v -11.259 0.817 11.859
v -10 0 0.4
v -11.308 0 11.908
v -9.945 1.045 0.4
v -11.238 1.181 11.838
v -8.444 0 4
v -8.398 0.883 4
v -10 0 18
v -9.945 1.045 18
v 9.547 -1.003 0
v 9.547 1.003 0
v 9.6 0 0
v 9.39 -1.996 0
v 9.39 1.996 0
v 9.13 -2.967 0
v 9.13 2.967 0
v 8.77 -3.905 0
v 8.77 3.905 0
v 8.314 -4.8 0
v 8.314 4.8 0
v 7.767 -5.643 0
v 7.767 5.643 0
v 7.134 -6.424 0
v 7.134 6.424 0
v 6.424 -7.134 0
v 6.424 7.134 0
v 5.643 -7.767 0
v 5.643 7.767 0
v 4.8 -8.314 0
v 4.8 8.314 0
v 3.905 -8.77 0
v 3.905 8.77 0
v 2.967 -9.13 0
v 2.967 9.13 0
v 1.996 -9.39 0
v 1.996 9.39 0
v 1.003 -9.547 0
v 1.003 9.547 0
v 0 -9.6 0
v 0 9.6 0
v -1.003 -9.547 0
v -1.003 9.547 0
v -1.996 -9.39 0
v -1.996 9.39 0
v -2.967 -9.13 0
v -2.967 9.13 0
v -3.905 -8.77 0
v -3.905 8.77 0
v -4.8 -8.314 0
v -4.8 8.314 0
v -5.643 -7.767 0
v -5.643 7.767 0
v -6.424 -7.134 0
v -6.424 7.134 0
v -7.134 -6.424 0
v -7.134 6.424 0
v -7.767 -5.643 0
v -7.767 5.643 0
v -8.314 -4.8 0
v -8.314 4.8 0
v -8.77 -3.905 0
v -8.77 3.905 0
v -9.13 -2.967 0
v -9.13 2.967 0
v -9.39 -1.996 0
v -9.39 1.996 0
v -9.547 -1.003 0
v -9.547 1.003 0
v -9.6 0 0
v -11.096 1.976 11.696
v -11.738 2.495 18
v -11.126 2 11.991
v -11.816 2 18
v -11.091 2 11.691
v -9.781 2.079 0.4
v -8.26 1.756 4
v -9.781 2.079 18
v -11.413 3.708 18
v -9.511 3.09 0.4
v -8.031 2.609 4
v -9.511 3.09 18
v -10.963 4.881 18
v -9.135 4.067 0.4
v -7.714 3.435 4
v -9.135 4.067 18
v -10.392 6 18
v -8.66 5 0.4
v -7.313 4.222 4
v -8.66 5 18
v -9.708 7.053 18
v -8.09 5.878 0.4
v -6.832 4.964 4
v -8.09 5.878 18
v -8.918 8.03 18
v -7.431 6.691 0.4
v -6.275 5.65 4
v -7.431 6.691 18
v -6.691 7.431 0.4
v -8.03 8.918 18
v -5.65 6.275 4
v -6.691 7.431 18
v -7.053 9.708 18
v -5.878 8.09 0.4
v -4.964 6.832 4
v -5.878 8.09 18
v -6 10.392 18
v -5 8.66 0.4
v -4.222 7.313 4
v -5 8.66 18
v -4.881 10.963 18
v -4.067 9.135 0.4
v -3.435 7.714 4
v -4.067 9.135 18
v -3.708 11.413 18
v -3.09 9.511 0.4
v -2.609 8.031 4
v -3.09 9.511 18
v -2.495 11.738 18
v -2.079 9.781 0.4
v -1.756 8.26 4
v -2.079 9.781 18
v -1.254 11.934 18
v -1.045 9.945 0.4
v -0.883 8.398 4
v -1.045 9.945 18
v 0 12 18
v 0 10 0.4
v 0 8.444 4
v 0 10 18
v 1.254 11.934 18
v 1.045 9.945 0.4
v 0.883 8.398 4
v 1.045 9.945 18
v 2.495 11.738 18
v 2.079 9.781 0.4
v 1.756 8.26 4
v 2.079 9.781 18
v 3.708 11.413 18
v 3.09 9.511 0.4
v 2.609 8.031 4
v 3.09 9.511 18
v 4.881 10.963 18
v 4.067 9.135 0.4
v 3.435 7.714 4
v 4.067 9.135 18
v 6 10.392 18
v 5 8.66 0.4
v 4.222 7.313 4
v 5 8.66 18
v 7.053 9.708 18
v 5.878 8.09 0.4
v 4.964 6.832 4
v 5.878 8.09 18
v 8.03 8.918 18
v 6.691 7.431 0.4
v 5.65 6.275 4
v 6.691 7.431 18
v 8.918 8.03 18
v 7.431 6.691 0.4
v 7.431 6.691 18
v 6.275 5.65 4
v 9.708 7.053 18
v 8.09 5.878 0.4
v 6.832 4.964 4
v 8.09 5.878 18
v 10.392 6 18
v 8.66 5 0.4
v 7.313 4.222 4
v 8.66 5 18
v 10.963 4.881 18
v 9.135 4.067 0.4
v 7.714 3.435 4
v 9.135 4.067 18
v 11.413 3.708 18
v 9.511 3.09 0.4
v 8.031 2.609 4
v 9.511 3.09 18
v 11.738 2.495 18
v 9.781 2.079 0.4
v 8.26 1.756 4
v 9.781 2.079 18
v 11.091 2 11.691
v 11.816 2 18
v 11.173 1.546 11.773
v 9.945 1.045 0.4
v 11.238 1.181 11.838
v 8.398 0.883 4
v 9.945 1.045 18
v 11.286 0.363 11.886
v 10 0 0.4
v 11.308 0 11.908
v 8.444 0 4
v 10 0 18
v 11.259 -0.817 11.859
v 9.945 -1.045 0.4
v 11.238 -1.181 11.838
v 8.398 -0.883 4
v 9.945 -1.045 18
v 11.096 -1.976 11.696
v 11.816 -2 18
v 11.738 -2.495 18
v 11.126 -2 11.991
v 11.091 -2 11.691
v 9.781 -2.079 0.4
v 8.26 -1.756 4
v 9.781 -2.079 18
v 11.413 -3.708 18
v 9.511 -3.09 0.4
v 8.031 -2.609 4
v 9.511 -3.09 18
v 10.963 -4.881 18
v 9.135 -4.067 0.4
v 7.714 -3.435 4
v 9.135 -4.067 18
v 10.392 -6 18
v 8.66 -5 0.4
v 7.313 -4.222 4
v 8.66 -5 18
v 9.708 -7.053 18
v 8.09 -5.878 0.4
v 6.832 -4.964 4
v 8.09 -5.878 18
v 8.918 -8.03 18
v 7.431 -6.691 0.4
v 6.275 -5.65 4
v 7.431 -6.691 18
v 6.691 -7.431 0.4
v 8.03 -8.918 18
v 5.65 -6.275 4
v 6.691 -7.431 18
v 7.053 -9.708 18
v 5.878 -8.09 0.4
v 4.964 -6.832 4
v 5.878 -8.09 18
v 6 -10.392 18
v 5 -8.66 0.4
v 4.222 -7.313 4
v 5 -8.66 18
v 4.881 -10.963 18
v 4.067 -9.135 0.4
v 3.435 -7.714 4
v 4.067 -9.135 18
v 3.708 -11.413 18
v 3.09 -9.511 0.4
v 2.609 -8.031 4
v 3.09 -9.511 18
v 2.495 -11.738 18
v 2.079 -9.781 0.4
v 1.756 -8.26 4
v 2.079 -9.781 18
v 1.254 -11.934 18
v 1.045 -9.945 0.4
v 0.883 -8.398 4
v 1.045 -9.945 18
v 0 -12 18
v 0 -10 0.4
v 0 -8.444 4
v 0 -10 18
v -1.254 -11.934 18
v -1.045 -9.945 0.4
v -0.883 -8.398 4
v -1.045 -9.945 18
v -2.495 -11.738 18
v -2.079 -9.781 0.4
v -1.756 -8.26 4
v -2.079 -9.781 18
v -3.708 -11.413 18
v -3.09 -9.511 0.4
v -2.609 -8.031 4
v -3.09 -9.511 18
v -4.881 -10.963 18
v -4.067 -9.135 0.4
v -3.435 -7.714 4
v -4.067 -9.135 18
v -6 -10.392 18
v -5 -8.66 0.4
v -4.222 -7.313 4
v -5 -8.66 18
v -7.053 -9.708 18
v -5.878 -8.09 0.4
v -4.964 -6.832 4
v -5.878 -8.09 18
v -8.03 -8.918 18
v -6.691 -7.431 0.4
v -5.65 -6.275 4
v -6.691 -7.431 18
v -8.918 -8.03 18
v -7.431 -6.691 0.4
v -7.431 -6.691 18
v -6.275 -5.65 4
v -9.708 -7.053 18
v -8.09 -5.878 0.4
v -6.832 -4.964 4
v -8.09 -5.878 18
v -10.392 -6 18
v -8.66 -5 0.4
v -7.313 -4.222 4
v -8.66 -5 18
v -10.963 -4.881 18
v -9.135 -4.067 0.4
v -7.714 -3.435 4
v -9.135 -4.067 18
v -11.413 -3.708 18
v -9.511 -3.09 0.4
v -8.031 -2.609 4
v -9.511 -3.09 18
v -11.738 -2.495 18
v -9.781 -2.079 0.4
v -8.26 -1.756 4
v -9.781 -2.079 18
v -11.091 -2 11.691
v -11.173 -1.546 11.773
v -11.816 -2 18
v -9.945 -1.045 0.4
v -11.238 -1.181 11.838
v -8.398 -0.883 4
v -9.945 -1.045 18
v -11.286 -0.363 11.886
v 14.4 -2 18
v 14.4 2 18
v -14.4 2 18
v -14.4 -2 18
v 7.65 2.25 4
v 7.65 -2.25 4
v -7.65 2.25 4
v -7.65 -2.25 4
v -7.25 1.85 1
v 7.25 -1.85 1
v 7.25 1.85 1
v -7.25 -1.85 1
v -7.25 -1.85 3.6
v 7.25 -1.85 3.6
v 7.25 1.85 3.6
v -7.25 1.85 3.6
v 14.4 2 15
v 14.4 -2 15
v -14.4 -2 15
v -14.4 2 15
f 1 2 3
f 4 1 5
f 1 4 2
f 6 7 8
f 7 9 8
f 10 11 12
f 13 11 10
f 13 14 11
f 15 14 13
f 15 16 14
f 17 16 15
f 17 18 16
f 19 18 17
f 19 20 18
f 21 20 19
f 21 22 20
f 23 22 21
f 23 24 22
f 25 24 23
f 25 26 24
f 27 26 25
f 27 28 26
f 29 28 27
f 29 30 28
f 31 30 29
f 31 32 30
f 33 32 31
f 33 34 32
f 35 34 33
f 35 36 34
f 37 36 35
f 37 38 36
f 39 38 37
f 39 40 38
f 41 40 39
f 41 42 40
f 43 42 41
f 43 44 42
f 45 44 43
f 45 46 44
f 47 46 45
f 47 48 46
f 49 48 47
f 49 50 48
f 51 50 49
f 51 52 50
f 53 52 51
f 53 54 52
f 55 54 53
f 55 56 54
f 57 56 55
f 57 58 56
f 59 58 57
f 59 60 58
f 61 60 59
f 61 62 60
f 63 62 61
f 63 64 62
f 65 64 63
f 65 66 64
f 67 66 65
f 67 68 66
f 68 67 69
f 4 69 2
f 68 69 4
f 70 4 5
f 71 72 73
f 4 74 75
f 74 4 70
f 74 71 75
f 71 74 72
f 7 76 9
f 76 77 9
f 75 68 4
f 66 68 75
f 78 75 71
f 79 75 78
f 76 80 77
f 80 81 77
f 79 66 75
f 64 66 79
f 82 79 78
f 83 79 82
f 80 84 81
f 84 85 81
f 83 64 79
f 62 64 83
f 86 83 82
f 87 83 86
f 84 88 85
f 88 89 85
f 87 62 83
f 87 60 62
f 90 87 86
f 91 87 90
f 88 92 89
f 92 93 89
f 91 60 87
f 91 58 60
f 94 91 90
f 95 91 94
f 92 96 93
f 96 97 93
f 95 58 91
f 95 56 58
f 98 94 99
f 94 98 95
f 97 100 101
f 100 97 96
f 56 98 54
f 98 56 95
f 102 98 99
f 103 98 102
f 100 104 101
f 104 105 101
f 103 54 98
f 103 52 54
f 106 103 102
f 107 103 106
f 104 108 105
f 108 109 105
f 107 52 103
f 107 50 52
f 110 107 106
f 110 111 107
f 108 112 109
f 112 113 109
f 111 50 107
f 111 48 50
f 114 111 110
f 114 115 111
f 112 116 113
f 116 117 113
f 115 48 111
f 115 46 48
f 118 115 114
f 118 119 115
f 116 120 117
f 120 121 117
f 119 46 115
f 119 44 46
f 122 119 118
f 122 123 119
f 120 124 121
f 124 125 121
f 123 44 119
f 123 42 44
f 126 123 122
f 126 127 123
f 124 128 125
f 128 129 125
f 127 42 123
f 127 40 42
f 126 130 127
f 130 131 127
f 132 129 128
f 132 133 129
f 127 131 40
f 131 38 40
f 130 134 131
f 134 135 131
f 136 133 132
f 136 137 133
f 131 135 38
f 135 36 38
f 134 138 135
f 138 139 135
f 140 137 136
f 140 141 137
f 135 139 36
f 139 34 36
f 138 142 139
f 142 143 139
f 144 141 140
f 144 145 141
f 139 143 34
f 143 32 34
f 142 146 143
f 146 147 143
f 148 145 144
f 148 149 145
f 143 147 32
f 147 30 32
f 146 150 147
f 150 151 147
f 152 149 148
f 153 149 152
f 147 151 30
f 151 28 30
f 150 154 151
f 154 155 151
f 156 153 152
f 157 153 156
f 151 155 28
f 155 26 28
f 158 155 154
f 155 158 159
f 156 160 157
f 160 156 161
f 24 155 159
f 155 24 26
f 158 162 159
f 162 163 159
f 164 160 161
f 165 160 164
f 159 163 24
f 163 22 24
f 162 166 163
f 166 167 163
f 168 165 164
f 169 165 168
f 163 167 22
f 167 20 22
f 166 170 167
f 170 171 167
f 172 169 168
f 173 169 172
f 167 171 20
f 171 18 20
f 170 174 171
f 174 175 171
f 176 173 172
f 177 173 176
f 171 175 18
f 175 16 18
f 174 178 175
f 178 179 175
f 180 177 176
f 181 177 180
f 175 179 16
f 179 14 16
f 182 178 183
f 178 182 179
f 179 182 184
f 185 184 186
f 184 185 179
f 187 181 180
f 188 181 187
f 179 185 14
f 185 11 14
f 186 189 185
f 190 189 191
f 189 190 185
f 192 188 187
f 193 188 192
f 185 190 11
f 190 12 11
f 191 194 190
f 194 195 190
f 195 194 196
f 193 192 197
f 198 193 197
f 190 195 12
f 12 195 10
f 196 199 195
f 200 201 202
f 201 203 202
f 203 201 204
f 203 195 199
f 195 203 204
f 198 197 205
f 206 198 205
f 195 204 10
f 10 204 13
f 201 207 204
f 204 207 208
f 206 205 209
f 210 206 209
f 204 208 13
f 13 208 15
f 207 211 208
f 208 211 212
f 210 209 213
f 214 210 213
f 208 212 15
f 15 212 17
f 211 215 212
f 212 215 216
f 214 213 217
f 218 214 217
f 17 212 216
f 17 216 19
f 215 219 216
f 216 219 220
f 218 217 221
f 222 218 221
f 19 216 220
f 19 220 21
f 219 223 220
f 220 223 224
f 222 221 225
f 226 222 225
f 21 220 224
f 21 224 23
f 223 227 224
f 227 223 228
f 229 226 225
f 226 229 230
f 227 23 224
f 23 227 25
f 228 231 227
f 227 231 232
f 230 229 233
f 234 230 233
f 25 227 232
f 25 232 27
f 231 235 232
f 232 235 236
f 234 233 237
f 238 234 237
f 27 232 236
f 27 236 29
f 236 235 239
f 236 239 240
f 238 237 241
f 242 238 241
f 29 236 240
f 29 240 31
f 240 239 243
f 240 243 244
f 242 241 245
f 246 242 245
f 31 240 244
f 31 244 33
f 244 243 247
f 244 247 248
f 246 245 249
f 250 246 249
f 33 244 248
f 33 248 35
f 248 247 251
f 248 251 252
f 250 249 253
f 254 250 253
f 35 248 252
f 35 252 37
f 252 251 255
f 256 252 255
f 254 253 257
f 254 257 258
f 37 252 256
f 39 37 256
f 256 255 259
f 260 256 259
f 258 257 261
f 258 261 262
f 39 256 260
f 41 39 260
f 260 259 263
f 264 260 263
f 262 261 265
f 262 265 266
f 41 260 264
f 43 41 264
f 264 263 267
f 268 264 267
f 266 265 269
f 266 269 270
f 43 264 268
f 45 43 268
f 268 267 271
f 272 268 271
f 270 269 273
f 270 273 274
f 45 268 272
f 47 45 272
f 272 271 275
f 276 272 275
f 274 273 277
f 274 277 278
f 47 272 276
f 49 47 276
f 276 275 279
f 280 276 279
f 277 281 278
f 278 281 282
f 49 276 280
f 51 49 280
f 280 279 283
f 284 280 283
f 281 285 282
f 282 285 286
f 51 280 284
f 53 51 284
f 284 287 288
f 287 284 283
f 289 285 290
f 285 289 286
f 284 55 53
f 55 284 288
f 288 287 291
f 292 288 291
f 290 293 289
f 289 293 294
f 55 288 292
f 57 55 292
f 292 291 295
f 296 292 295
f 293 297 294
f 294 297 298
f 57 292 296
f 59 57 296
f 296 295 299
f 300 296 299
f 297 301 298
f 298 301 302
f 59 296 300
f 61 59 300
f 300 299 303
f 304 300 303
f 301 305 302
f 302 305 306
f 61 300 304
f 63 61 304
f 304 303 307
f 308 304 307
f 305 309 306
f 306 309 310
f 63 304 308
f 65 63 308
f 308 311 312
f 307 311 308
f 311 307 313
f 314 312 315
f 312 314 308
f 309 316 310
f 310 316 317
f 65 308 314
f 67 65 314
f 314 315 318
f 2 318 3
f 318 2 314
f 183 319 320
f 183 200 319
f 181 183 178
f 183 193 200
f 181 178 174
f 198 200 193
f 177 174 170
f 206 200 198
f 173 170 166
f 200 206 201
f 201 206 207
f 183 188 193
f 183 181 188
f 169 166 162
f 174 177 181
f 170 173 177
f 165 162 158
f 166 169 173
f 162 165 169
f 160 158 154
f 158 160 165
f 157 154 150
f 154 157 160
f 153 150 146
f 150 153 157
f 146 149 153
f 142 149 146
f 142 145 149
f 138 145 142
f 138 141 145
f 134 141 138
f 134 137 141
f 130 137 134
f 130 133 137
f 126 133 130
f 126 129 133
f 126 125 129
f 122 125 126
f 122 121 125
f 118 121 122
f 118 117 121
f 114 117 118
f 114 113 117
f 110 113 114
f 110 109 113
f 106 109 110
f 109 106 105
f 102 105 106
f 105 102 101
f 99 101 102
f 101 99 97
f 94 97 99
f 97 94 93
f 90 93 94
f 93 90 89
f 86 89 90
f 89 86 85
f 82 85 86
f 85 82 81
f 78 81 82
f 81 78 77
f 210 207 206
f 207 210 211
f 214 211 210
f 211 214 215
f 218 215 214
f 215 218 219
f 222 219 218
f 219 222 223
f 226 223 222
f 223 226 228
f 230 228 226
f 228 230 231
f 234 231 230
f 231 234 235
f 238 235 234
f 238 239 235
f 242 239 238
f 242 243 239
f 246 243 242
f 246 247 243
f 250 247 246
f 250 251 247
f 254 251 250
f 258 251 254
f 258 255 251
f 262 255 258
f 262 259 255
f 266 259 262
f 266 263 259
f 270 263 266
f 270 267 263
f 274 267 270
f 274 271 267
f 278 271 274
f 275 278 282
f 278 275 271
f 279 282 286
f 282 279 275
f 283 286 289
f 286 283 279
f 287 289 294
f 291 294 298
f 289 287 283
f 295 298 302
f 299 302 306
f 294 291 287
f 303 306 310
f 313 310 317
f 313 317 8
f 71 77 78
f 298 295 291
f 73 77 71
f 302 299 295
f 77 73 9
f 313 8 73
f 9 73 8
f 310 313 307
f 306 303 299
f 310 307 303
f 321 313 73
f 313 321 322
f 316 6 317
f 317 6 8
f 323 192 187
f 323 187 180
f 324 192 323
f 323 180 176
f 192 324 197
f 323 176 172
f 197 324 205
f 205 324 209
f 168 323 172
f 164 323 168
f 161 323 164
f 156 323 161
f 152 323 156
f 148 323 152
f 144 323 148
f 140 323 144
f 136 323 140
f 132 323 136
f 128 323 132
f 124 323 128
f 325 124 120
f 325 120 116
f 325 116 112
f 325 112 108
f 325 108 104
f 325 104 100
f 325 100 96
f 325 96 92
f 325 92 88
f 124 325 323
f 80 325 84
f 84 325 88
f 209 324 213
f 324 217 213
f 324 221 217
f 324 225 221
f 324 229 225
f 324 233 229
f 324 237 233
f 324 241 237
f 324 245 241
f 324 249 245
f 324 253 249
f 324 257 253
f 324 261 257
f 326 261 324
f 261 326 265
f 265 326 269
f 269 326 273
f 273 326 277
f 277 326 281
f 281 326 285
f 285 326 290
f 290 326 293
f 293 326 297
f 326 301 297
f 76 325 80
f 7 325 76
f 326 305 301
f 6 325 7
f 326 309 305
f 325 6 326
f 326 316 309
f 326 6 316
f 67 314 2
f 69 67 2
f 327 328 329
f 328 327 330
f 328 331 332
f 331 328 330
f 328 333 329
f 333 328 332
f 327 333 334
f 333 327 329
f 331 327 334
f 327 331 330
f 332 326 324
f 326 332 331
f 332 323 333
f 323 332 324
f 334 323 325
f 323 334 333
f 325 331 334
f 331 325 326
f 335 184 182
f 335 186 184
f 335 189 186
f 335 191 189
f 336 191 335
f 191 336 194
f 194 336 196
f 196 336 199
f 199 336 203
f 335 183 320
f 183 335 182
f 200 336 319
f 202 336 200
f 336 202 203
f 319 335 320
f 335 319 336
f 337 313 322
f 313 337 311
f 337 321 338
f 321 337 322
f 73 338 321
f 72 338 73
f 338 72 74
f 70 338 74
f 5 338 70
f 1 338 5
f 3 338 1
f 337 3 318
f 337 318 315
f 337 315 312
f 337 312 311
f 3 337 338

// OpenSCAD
// file: bucket_lib.scad
// bucket_lib.scad - bucket shapes shared by the hand washing point (design_brief.md 4.9)
// and the mop bucket (4.11); the waste bin (4.7) uses the closed form too.
// Load from a model with:  use <bucket_lib.scad>
// The modules read their shared values from common.scad themselves.
include <common.scad>

function bucket_r(rb, rt, h, z) = rb + (rt - rb) * z / h;   // outer radius at height z

// Body of revolution, base on z = 0, centred on the z axis.
//   d_bottom, d_top   outer diameters at the base and at height h; different values taper
//   wall, floor_t     > 0: open bucket with this wall and floor; 0: solid body
//   lid_h, lip        > 0: closed top with a lid lid_h high, overhanging by lip on a 45 deg underside
//   cb                bottom chamfer; 0 when the bucket stands on another part
//   ct                top chamfer of the lid or of a solid body; an open rim gets none
module bucket(d_bottom, d_top, h, wall = 0, floor_t = 0, lid_h = 0, lip = 0, cb = chamfer_bottom, ct = 0) {
    rb = d_bottom / 2;
    rt = d_top / 2;
    base = concat([[0, 0]], cb > 0 ? [[rb - cb, 0], [rb, cb]] : [[rb, 0]]);
    top = lid_h > 0 ?
              concat([[rt, h]], lip > 0 ? [[rt + lip, h + lip]] : [],
                     ct > 0 ? [[rt + lip, h + lid_h - ct], [rt + lip - ct, h + lid_h]] : [[rt + lip, h + lid_h]],
                     [[0, h + lid_h]]) :
          wall > 0 ?
              [[rt, h], [rt - wall, h], [bucket_r(rb, rt, h, floor_t) - wall, floor_t], [0, floor_t]] :
          ct > 0 ?
              [[rt, h - ct], [rt - ct, h], [0, h]] :
              [[rt, h], [0, h]];
    rotate_extrude() polygon(concat(base, top));
}

// Lug on the outside wall at +x: w wide, reaching out beyond the wall, h high with its top at
// z_top, underside at 45 deg. r_wall is the outer radius at z_top; the lug continues inset
// into the wall (and further down at 45 deg) so it merges with a tapered wall.
module bucket_lug(r_wall, z_top, w = 4, out = min_handled, h = 3, inset = 1)
    rotate([90, 0, 0]) linear_extrude(height = w, center = true)
        polygon([[r_wall - inset, z_top - h - out - inset], [r_wall + out, z_top - h],
                 [r_wall + out, z_top], [r_wall - inset, z_top]]);
// main file
// mop_and_bucket.scad - cleaning mop and bucket (design_brief.md 4.11), two parts:
//   part = "bucket": open bucket dia 20 at the base, dia 24 at the rim, 18 high, 2.0 wall,
//                    4 mm floor with a slot for the mop head (14.5 x 3.7 x 3 at the shared
//                    clearances), two rim lugs 4 wide reaching 2.4 out; bbox 28.8 x 24 x 18
//   part = "mop":    flat part 52 x 14 x 3.4: 3.4 mm handle, 14 x 12 head with three 1.6 mm
//                    fringe notches; prints lying flat, stands in the bucket slot
// Single colour each.   Export: openscad -o mop_bucket.stl -D 'part="bucket"' mop_and_bucket.scad
//                               openscad -o mop.stl        -D 'part="mop"'    mop_and_bucket.scad
include <common.scad>
use <bucket_lib.scad>

part = "bucket";

// bucket
d_bottom   = 20;
d_top      = 24;
height     = 18;
wall       = 2.0;
floor_t    = 4;
slot_depth = 3;
lug_w      = 4;
lug_h      = 3;
lug_out    = min_handled;    // 2.4
// mop
mop_len     = 52;            // along x
mop_t       = 3.4;           // part thickness and handle width
head        = [12, 14];      // along the handle, across
notch_w     = min_gap;       // 1.6
notch_depth = 5;
notches     = 3;

mop_slot_l = head[1] + slot_end_clearance;   // 14.5, from common.scad
mop_slot_w = mop_t + slot_clearance;         // 3.7
strand     = (head[1] - notches * notch_w) / (notches + 1);   // 2.3 between notches

module mop_bucket() band_colour(1) {
    difference() {
        bucket(d_bottom, d_top, height, wall = wall, floor_t = floor_t, cb = chamfer_bottom);
        slot_cut(top = floor_t, l = mop_slot_l, w = mop_slot_w, d = slot_depth);
    }
    for (a = [0, 180]) rotate([0, 0, a]) bucket_lug(d_top / 2, height, w = lug_w, out = lug_out, h = lug_h);
}

module mop_2d() difference() {
    union() {
        translate([0, -head[1] / 2]) square(head);
        translate([head[0] - 1, -mop_t / 2]) square([mop_len - head[0] + 1, mop_t]);
    }
    for (i = [0 : notches - 1])
        translate([-1, -head[1] / 2 + strand + i * (strand + notch_w)]) square([notch_depth + 1, notch_w]);
}

module mop() band_colour(1) extrude_chamfered(mop_t) mop_2d();

if (part == "bucket") mop_bucket();
else if (part == "mop") mop();
else assert(false, str("part = \"", part, "\": use \"bucket\" or \"mop\""));
